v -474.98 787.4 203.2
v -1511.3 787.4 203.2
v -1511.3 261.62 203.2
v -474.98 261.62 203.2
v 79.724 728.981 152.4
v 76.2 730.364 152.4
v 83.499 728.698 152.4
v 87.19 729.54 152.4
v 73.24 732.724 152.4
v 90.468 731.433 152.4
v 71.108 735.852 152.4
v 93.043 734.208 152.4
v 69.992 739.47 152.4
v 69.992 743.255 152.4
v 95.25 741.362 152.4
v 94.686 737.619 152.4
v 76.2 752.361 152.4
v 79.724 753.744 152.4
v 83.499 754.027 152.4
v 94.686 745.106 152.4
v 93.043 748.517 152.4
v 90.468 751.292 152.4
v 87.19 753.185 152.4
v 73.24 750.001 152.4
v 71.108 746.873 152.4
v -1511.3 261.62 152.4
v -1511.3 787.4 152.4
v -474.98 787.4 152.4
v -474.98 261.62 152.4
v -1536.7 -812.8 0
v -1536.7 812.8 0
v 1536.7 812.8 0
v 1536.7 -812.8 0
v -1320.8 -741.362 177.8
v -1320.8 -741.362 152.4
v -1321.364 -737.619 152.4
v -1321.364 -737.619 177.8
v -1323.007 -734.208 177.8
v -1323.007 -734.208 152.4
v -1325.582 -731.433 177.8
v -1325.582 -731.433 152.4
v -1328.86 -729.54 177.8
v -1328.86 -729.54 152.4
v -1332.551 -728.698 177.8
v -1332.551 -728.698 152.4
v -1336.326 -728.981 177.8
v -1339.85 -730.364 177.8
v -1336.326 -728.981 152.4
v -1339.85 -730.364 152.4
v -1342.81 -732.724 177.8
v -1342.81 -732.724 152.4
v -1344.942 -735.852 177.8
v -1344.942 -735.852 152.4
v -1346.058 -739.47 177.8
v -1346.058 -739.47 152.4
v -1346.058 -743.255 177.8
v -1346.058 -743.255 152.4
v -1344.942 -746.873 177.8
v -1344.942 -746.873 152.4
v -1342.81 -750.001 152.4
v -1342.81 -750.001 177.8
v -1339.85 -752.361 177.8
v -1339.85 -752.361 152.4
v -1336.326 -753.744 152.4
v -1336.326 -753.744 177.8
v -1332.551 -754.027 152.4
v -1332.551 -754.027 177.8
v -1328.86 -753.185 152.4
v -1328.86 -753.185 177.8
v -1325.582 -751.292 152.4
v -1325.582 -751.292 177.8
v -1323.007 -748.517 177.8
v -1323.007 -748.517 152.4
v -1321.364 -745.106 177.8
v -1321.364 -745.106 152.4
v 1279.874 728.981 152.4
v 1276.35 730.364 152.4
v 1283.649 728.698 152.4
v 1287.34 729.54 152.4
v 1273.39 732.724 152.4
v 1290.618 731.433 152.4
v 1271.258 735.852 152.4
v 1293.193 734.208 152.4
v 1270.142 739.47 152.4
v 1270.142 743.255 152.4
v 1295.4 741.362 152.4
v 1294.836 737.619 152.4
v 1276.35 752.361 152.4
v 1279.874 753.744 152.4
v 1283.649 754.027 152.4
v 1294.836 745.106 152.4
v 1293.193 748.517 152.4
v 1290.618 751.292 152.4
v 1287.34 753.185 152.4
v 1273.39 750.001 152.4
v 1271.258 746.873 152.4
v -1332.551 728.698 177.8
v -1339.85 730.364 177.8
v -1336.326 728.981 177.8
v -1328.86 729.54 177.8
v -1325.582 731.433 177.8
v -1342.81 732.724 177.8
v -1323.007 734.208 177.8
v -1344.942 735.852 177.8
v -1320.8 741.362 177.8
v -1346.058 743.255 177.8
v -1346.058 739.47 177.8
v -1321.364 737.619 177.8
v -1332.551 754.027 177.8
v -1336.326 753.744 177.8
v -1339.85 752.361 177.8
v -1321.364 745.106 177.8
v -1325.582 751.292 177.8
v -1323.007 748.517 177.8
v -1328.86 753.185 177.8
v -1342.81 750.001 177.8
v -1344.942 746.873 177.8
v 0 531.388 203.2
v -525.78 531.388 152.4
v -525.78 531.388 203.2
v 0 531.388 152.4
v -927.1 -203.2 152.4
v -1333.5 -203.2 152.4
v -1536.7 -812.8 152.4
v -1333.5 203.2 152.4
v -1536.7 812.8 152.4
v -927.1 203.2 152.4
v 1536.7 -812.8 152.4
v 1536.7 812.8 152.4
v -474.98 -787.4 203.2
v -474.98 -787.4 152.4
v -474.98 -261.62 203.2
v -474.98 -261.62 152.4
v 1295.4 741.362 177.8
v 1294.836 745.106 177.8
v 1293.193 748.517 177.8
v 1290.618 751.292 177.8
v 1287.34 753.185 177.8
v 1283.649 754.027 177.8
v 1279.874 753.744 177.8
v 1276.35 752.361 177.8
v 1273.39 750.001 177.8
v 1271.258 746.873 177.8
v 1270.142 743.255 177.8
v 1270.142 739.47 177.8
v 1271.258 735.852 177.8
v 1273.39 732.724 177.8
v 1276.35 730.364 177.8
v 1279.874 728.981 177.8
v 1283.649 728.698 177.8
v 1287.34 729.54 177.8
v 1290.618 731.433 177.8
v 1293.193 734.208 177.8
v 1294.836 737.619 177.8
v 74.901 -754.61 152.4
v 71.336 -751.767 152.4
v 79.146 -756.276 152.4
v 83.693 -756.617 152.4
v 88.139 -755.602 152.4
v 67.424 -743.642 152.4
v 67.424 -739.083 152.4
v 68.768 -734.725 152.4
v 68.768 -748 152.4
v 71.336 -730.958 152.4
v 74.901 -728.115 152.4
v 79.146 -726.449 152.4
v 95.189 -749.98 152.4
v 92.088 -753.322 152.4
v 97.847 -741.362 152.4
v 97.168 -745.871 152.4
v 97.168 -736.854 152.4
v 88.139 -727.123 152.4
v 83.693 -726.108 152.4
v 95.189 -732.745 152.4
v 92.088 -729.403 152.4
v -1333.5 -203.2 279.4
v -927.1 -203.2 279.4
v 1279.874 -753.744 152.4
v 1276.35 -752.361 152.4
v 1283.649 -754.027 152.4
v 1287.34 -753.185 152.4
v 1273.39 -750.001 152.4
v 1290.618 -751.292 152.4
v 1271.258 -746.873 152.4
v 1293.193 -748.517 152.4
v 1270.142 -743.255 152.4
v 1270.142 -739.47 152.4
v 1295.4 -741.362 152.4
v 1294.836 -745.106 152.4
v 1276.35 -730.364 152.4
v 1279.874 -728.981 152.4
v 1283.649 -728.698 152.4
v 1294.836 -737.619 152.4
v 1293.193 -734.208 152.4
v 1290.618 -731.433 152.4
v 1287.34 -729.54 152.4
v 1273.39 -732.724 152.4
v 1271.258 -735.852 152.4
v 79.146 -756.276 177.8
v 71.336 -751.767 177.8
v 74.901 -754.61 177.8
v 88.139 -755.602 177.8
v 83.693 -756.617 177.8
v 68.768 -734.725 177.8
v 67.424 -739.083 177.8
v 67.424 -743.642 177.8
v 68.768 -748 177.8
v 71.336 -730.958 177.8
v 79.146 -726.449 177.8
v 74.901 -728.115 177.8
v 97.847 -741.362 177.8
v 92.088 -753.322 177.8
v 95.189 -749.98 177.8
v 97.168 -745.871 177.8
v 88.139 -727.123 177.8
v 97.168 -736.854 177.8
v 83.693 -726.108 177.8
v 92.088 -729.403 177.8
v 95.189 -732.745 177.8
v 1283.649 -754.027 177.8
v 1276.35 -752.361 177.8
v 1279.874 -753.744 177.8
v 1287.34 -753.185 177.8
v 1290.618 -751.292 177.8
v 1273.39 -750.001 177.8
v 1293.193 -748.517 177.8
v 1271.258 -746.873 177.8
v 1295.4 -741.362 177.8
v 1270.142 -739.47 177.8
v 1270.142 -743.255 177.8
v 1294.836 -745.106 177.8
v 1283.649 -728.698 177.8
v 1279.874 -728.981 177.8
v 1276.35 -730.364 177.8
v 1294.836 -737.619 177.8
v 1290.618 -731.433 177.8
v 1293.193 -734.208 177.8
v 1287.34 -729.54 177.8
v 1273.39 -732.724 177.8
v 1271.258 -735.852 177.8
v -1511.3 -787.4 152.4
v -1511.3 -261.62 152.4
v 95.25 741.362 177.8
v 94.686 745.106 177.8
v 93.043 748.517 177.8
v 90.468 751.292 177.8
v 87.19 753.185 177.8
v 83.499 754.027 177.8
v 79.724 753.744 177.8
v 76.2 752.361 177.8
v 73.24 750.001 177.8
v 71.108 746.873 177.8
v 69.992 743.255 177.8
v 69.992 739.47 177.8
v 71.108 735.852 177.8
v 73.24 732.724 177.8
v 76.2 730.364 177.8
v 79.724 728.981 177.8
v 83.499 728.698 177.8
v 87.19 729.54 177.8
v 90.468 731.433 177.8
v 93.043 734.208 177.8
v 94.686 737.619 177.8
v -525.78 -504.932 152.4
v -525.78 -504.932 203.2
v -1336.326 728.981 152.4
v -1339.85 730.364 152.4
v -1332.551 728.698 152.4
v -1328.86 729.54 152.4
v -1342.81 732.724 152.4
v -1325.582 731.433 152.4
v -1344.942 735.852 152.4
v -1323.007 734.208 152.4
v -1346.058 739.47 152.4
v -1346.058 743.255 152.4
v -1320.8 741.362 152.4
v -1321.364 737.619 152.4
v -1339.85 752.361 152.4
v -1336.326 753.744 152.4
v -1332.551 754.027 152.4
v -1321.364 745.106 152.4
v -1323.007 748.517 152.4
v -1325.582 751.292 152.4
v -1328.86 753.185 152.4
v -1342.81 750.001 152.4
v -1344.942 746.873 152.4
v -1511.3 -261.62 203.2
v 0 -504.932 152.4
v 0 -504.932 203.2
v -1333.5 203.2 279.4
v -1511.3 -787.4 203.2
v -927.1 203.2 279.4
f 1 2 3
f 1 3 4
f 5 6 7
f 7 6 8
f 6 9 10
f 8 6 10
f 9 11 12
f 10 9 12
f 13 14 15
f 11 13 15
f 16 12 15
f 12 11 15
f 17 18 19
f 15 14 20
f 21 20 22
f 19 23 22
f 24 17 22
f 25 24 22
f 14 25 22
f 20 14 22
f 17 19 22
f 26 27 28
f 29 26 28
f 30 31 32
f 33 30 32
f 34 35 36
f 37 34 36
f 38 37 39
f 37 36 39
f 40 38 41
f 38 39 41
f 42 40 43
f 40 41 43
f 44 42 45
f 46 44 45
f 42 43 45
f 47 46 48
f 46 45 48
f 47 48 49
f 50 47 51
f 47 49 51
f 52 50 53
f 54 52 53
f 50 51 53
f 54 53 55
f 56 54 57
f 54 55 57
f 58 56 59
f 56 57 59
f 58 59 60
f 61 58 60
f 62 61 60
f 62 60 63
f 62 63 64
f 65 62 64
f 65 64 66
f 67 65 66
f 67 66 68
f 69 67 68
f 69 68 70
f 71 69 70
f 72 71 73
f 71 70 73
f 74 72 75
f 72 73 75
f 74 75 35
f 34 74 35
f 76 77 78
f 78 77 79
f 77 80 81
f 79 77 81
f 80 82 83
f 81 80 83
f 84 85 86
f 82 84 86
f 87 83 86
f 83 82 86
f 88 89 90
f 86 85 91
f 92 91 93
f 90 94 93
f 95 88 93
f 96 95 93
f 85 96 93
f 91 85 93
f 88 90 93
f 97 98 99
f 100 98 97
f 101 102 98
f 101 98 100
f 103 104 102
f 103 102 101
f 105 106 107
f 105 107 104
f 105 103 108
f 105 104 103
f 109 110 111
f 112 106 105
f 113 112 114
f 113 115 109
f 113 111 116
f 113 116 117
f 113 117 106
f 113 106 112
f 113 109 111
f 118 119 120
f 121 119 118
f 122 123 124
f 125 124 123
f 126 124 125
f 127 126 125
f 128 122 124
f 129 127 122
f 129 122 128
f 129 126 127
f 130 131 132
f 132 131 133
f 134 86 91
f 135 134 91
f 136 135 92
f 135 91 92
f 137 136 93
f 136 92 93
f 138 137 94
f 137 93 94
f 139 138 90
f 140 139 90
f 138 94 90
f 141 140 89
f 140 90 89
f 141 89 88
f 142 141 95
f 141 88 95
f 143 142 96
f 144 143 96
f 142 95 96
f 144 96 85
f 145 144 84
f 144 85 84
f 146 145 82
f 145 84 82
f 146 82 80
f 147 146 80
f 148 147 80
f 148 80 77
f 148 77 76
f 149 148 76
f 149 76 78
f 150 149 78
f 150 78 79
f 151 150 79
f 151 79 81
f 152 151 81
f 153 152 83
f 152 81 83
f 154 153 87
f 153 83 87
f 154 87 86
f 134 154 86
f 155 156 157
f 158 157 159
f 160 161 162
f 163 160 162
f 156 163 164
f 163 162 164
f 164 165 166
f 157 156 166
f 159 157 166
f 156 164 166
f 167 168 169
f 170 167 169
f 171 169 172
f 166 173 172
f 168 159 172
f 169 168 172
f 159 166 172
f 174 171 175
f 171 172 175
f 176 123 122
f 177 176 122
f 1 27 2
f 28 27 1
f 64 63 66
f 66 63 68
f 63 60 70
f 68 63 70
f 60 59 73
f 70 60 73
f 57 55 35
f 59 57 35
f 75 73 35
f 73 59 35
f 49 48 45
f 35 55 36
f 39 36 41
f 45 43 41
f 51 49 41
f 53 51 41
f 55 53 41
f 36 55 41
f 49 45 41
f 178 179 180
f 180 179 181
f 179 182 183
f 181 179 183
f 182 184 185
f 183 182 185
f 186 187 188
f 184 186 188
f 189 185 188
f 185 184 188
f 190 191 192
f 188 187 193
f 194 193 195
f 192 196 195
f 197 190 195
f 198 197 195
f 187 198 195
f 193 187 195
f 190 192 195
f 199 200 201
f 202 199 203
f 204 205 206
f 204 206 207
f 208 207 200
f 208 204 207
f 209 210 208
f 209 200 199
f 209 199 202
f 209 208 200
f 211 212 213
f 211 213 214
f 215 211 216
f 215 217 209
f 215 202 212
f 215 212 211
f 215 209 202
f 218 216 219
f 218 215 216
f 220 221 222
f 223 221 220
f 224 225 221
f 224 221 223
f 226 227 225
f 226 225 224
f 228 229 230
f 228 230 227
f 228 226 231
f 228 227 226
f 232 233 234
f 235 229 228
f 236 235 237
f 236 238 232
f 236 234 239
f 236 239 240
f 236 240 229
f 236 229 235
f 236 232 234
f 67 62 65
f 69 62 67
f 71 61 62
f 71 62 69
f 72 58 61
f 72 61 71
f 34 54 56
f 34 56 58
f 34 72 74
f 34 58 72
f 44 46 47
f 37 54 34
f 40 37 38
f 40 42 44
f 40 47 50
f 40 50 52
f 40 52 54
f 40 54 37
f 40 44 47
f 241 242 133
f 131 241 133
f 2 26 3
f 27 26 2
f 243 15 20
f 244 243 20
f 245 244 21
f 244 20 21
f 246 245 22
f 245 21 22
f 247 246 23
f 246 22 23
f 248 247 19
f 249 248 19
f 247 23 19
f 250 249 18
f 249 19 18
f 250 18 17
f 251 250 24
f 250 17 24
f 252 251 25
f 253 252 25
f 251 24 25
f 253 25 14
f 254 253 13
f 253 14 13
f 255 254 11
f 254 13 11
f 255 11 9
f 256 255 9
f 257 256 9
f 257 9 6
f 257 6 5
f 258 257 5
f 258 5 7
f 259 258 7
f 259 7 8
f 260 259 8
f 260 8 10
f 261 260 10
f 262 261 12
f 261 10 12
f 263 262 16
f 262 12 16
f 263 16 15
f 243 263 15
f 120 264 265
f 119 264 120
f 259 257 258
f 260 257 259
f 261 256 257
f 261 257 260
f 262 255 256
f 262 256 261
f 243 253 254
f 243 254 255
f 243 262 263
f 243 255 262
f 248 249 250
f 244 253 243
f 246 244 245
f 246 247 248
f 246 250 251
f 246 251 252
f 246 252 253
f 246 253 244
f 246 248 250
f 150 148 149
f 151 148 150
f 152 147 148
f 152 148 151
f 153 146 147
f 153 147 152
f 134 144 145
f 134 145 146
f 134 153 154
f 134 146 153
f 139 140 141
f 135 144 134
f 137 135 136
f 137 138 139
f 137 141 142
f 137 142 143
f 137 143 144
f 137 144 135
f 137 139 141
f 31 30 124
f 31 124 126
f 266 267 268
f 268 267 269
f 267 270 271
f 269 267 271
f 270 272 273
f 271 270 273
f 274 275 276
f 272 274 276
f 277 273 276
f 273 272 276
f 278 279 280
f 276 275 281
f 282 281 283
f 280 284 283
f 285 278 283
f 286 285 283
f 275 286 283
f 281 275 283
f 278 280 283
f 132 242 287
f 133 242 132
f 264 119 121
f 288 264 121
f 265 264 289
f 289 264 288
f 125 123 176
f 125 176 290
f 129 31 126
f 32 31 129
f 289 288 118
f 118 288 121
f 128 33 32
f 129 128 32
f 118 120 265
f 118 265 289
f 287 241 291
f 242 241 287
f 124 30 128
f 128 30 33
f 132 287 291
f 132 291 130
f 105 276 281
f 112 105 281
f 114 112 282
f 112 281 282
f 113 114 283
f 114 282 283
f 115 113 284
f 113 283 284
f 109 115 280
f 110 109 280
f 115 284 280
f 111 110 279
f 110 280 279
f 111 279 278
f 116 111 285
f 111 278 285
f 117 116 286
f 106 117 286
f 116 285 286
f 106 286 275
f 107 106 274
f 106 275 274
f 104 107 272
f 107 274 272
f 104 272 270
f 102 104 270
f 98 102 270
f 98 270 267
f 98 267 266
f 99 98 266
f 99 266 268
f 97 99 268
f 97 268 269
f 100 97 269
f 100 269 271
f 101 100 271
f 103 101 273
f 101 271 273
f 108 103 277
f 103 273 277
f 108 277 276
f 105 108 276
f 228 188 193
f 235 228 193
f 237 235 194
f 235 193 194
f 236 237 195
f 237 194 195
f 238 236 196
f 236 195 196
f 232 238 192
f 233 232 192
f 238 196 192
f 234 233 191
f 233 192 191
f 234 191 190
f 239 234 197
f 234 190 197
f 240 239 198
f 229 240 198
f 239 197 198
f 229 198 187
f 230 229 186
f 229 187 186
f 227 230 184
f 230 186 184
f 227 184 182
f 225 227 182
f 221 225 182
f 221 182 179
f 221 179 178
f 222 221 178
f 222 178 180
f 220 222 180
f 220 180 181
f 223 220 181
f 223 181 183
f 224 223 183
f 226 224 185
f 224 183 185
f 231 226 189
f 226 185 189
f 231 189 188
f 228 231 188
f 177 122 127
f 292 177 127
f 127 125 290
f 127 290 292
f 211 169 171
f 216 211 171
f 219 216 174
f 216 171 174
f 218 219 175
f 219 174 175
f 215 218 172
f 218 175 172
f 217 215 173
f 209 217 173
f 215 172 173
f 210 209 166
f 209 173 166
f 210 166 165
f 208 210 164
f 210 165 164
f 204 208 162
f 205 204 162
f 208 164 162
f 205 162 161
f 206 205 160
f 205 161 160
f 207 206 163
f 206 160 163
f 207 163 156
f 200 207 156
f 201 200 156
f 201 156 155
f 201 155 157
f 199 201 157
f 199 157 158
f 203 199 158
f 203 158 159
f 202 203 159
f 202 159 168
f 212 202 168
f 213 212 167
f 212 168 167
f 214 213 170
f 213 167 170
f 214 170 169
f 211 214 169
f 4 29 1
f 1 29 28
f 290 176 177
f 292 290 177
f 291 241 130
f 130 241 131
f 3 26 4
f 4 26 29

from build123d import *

# Parameters (mm, degrees)
F0_W     = 3073.4
F0_H     = 1625.6
F1_DEPTH = 152.4
F2_W     = 406.4
F2_H     = 406.4
F3_DEPTH = 127
F4_W     = 1036.32
F4_H     = 525.78
F5_DEPTH = 50.8
F6_R     = 12.7
F6_R_2   = 15.297211
F7_DEPTH = 25.4
F8_W     = 525.78
F8_H     = 1036.32
F9_DEPTH = 50.8


with BuildPart() as f1:
    # F0 (on Top) → F1 (new body)
    with BuildSketch(Plane.XY):
        Rectangle(F0_W, F0_H)
    extrude(amount=F1_DEPTH)

    # F2 (on face) → F3 (join)
    with BuildSketch(Plane.XY.offset(152.4)):
        with Locations((-1130.3, 0)):
            Rectangle(F2_W, F2_H)
    extrude(amount=F3_DEPTH)


with BuildPart() as f5:
    # F4 (on face) → F5 (new body)
    with BuildSketch(Plane.XY.offset(152.4)):
        with Locations((-993.14, -524.51)):
            Rectangle(F4_W, F4_H)
        with Locations((-993.14, 524.51)):
            Rectangle(F4_W, F4_H)
    extrude(amount=F5_DEPTH)


with BuildPart() as f7:
    # F6 (on face) → F7 (new body)
    with BuildSketch(Plane.XY.offset(152.4)):
        with Locations((-1333.5, 741.3625)):
            Circle(F6_R)
        with Locations((-1333.5, -741.3625)):
            Circle(F6_R)
        with Locations((82.55, -741.3625)):
            Circle(F6_R_2)
        with Locations((1282.7, -741.3625)):
            Circle(F6_R)
        with Locations((1282.7, 741.3625)):
            Circle(F6_R)
        with Locations((82.55, 741.3625)):
            Circle(F6_R)
    extrude(amount=F7_DEPTH)


with BuildPart() as f9:
    # F8 (on face) → F9 (new body)
    with BuildSketch(Plane.XY.offset(152.4)):
        with Locations((-262.89, 13.227703)):
            Rectangle(F8_W, F8_H)
    extrude(amount=F9_DEPTH)


solid = Compound([f1.part, f5.part, f7.part, f9.part])
